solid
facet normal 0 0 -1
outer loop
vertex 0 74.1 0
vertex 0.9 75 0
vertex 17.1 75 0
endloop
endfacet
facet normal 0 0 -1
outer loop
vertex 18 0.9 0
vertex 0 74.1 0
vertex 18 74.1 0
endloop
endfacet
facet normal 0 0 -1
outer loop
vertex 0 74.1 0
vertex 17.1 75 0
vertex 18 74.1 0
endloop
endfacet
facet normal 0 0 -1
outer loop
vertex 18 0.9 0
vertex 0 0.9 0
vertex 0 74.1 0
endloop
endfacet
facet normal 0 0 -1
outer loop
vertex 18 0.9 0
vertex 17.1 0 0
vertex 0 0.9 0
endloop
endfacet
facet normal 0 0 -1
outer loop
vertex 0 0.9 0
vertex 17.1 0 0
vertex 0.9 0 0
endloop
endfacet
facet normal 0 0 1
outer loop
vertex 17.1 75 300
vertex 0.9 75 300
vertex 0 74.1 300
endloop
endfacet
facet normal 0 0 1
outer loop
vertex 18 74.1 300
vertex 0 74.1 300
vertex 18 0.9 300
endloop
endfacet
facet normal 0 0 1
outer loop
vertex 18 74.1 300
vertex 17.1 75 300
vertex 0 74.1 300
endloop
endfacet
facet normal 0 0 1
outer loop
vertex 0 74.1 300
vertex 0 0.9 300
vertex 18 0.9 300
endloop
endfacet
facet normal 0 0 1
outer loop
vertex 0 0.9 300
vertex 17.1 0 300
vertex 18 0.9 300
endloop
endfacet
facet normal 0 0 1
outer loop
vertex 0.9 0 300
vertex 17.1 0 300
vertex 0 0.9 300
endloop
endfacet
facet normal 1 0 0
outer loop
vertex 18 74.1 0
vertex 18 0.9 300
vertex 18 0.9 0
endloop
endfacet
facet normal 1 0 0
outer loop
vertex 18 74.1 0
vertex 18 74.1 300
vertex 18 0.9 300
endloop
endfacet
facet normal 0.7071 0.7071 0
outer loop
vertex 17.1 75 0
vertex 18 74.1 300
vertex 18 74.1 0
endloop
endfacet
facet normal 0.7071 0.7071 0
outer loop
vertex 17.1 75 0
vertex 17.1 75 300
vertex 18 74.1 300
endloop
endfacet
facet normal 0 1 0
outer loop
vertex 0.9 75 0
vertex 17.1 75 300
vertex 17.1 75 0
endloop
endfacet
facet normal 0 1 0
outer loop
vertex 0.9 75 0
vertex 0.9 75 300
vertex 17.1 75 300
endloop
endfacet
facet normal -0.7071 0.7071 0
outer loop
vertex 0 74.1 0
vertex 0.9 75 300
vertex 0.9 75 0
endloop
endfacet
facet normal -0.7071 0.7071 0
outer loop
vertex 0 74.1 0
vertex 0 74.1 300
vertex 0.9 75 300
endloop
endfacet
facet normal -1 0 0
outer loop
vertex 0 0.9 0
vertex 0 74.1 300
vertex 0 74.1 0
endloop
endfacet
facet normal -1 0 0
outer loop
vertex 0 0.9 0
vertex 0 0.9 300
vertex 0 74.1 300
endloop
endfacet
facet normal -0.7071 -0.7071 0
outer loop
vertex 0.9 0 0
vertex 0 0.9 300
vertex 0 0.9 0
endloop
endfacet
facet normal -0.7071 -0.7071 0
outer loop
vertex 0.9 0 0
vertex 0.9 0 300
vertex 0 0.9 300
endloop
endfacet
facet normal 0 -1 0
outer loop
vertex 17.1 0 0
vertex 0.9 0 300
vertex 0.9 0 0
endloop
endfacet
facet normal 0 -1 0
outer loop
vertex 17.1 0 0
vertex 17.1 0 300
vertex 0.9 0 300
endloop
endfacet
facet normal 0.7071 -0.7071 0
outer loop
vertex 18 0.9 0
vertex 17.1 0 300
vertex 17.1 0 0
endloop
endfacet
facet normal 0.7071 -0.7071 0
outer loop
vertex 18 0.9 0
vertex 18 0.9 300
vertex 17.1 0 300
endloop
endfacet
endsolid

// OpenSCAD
// Generic wooden member helpers.
// Open this file directly in OpenSCAD to tune and render a simple beam.

/* [Standalone preview] */
beam_width = 18;
beam_depth = 75;
beam_height = 300;
beam_edge_radius = 0.9;

// Wooden members get a very small visual corner radius. The radius is
// deliberately subtle: it helps separate adjoining parts in preview without
// materially changing the nominal dimensions used for the design.
module wood_beam(width, depth, height, radius = 0.9) {
    r = min(radius, min(width, depth) / 4);
    if (r <= 0)
        cube([width, depth, height]);
    else
        linear_extrude(height = height)
            offset(r = r)
                offset(delta = -r)
                    square([width, depth]);
}

// Extrude a 2D polygon drawn in the Y/Z plane through X.
module wood_prism_yz(width, points, radius = 0.9) {
    multmatrix([
        [0, 0, 1, 0],
        [1, 0, 0, 0],
        [0, 1, 0, 0],
        [0, 0, 0, 1]
    ])
        linear_extrude(height = width)
            if (radius > 0)
                offset(r = radius)
                    offset(delta = -radius)
                        polygon(points = points);
            else
                polygon(points = points);
}

module wood_arm_yz(width, rear_y, bottom_z, length, thickness, angle) {
    front_y = rear_y + length * cos(angle);
    rise    = (front_y - rear_y) * tan(angle);
    dz      = thickness / cos(angle);

    wood_prism_yz(width, [
        [rear_y,  bottom_z],
        [front_y, bottom_z + rise],
        [front_y, bottom_z + rise + dz],
        [rear_y,  bottom_z + dz]
    ]);
}

module wood_brace_to_arm_yz(
    width,
    rear_y,
    lower_z,
    thickness,
    brace_angle,
    arm_bottom_z,
    arm_angle,
    arm_rear_y = undef
) {
    ary = is_undef(arm_rear_y) ? rear_y : arm_rear_y;
    brace_dz = thickness / cos(brace_angle);
    ta = tan(arm_angle);
    tb = tan(brace_angle);

    y_low = (arm_bottom_z - ta * ary - lower_z + tb * rear_y) / (tb - ta);
    y_high = (arm_bottom_z - ta * ary - lower_z - brace_dz + tb * rear_y) / (tb - ta);

    z_low  = lower_z + tb * (y_low - rear_y);
    z_high = lower_z + brace_dz + tb * (y_high - rear_y);

    wood_prism_yz(width, [
        [rear_y, lower_z],
        [y_low,  z_low],
        [y_high, z_high],
        [rear_y, lower_z + brace_dz]
    ]);
}

// Standalone component preview/render.
wood_beam(beam_width, beam_depth, beam_height, beam_edge_radius);
